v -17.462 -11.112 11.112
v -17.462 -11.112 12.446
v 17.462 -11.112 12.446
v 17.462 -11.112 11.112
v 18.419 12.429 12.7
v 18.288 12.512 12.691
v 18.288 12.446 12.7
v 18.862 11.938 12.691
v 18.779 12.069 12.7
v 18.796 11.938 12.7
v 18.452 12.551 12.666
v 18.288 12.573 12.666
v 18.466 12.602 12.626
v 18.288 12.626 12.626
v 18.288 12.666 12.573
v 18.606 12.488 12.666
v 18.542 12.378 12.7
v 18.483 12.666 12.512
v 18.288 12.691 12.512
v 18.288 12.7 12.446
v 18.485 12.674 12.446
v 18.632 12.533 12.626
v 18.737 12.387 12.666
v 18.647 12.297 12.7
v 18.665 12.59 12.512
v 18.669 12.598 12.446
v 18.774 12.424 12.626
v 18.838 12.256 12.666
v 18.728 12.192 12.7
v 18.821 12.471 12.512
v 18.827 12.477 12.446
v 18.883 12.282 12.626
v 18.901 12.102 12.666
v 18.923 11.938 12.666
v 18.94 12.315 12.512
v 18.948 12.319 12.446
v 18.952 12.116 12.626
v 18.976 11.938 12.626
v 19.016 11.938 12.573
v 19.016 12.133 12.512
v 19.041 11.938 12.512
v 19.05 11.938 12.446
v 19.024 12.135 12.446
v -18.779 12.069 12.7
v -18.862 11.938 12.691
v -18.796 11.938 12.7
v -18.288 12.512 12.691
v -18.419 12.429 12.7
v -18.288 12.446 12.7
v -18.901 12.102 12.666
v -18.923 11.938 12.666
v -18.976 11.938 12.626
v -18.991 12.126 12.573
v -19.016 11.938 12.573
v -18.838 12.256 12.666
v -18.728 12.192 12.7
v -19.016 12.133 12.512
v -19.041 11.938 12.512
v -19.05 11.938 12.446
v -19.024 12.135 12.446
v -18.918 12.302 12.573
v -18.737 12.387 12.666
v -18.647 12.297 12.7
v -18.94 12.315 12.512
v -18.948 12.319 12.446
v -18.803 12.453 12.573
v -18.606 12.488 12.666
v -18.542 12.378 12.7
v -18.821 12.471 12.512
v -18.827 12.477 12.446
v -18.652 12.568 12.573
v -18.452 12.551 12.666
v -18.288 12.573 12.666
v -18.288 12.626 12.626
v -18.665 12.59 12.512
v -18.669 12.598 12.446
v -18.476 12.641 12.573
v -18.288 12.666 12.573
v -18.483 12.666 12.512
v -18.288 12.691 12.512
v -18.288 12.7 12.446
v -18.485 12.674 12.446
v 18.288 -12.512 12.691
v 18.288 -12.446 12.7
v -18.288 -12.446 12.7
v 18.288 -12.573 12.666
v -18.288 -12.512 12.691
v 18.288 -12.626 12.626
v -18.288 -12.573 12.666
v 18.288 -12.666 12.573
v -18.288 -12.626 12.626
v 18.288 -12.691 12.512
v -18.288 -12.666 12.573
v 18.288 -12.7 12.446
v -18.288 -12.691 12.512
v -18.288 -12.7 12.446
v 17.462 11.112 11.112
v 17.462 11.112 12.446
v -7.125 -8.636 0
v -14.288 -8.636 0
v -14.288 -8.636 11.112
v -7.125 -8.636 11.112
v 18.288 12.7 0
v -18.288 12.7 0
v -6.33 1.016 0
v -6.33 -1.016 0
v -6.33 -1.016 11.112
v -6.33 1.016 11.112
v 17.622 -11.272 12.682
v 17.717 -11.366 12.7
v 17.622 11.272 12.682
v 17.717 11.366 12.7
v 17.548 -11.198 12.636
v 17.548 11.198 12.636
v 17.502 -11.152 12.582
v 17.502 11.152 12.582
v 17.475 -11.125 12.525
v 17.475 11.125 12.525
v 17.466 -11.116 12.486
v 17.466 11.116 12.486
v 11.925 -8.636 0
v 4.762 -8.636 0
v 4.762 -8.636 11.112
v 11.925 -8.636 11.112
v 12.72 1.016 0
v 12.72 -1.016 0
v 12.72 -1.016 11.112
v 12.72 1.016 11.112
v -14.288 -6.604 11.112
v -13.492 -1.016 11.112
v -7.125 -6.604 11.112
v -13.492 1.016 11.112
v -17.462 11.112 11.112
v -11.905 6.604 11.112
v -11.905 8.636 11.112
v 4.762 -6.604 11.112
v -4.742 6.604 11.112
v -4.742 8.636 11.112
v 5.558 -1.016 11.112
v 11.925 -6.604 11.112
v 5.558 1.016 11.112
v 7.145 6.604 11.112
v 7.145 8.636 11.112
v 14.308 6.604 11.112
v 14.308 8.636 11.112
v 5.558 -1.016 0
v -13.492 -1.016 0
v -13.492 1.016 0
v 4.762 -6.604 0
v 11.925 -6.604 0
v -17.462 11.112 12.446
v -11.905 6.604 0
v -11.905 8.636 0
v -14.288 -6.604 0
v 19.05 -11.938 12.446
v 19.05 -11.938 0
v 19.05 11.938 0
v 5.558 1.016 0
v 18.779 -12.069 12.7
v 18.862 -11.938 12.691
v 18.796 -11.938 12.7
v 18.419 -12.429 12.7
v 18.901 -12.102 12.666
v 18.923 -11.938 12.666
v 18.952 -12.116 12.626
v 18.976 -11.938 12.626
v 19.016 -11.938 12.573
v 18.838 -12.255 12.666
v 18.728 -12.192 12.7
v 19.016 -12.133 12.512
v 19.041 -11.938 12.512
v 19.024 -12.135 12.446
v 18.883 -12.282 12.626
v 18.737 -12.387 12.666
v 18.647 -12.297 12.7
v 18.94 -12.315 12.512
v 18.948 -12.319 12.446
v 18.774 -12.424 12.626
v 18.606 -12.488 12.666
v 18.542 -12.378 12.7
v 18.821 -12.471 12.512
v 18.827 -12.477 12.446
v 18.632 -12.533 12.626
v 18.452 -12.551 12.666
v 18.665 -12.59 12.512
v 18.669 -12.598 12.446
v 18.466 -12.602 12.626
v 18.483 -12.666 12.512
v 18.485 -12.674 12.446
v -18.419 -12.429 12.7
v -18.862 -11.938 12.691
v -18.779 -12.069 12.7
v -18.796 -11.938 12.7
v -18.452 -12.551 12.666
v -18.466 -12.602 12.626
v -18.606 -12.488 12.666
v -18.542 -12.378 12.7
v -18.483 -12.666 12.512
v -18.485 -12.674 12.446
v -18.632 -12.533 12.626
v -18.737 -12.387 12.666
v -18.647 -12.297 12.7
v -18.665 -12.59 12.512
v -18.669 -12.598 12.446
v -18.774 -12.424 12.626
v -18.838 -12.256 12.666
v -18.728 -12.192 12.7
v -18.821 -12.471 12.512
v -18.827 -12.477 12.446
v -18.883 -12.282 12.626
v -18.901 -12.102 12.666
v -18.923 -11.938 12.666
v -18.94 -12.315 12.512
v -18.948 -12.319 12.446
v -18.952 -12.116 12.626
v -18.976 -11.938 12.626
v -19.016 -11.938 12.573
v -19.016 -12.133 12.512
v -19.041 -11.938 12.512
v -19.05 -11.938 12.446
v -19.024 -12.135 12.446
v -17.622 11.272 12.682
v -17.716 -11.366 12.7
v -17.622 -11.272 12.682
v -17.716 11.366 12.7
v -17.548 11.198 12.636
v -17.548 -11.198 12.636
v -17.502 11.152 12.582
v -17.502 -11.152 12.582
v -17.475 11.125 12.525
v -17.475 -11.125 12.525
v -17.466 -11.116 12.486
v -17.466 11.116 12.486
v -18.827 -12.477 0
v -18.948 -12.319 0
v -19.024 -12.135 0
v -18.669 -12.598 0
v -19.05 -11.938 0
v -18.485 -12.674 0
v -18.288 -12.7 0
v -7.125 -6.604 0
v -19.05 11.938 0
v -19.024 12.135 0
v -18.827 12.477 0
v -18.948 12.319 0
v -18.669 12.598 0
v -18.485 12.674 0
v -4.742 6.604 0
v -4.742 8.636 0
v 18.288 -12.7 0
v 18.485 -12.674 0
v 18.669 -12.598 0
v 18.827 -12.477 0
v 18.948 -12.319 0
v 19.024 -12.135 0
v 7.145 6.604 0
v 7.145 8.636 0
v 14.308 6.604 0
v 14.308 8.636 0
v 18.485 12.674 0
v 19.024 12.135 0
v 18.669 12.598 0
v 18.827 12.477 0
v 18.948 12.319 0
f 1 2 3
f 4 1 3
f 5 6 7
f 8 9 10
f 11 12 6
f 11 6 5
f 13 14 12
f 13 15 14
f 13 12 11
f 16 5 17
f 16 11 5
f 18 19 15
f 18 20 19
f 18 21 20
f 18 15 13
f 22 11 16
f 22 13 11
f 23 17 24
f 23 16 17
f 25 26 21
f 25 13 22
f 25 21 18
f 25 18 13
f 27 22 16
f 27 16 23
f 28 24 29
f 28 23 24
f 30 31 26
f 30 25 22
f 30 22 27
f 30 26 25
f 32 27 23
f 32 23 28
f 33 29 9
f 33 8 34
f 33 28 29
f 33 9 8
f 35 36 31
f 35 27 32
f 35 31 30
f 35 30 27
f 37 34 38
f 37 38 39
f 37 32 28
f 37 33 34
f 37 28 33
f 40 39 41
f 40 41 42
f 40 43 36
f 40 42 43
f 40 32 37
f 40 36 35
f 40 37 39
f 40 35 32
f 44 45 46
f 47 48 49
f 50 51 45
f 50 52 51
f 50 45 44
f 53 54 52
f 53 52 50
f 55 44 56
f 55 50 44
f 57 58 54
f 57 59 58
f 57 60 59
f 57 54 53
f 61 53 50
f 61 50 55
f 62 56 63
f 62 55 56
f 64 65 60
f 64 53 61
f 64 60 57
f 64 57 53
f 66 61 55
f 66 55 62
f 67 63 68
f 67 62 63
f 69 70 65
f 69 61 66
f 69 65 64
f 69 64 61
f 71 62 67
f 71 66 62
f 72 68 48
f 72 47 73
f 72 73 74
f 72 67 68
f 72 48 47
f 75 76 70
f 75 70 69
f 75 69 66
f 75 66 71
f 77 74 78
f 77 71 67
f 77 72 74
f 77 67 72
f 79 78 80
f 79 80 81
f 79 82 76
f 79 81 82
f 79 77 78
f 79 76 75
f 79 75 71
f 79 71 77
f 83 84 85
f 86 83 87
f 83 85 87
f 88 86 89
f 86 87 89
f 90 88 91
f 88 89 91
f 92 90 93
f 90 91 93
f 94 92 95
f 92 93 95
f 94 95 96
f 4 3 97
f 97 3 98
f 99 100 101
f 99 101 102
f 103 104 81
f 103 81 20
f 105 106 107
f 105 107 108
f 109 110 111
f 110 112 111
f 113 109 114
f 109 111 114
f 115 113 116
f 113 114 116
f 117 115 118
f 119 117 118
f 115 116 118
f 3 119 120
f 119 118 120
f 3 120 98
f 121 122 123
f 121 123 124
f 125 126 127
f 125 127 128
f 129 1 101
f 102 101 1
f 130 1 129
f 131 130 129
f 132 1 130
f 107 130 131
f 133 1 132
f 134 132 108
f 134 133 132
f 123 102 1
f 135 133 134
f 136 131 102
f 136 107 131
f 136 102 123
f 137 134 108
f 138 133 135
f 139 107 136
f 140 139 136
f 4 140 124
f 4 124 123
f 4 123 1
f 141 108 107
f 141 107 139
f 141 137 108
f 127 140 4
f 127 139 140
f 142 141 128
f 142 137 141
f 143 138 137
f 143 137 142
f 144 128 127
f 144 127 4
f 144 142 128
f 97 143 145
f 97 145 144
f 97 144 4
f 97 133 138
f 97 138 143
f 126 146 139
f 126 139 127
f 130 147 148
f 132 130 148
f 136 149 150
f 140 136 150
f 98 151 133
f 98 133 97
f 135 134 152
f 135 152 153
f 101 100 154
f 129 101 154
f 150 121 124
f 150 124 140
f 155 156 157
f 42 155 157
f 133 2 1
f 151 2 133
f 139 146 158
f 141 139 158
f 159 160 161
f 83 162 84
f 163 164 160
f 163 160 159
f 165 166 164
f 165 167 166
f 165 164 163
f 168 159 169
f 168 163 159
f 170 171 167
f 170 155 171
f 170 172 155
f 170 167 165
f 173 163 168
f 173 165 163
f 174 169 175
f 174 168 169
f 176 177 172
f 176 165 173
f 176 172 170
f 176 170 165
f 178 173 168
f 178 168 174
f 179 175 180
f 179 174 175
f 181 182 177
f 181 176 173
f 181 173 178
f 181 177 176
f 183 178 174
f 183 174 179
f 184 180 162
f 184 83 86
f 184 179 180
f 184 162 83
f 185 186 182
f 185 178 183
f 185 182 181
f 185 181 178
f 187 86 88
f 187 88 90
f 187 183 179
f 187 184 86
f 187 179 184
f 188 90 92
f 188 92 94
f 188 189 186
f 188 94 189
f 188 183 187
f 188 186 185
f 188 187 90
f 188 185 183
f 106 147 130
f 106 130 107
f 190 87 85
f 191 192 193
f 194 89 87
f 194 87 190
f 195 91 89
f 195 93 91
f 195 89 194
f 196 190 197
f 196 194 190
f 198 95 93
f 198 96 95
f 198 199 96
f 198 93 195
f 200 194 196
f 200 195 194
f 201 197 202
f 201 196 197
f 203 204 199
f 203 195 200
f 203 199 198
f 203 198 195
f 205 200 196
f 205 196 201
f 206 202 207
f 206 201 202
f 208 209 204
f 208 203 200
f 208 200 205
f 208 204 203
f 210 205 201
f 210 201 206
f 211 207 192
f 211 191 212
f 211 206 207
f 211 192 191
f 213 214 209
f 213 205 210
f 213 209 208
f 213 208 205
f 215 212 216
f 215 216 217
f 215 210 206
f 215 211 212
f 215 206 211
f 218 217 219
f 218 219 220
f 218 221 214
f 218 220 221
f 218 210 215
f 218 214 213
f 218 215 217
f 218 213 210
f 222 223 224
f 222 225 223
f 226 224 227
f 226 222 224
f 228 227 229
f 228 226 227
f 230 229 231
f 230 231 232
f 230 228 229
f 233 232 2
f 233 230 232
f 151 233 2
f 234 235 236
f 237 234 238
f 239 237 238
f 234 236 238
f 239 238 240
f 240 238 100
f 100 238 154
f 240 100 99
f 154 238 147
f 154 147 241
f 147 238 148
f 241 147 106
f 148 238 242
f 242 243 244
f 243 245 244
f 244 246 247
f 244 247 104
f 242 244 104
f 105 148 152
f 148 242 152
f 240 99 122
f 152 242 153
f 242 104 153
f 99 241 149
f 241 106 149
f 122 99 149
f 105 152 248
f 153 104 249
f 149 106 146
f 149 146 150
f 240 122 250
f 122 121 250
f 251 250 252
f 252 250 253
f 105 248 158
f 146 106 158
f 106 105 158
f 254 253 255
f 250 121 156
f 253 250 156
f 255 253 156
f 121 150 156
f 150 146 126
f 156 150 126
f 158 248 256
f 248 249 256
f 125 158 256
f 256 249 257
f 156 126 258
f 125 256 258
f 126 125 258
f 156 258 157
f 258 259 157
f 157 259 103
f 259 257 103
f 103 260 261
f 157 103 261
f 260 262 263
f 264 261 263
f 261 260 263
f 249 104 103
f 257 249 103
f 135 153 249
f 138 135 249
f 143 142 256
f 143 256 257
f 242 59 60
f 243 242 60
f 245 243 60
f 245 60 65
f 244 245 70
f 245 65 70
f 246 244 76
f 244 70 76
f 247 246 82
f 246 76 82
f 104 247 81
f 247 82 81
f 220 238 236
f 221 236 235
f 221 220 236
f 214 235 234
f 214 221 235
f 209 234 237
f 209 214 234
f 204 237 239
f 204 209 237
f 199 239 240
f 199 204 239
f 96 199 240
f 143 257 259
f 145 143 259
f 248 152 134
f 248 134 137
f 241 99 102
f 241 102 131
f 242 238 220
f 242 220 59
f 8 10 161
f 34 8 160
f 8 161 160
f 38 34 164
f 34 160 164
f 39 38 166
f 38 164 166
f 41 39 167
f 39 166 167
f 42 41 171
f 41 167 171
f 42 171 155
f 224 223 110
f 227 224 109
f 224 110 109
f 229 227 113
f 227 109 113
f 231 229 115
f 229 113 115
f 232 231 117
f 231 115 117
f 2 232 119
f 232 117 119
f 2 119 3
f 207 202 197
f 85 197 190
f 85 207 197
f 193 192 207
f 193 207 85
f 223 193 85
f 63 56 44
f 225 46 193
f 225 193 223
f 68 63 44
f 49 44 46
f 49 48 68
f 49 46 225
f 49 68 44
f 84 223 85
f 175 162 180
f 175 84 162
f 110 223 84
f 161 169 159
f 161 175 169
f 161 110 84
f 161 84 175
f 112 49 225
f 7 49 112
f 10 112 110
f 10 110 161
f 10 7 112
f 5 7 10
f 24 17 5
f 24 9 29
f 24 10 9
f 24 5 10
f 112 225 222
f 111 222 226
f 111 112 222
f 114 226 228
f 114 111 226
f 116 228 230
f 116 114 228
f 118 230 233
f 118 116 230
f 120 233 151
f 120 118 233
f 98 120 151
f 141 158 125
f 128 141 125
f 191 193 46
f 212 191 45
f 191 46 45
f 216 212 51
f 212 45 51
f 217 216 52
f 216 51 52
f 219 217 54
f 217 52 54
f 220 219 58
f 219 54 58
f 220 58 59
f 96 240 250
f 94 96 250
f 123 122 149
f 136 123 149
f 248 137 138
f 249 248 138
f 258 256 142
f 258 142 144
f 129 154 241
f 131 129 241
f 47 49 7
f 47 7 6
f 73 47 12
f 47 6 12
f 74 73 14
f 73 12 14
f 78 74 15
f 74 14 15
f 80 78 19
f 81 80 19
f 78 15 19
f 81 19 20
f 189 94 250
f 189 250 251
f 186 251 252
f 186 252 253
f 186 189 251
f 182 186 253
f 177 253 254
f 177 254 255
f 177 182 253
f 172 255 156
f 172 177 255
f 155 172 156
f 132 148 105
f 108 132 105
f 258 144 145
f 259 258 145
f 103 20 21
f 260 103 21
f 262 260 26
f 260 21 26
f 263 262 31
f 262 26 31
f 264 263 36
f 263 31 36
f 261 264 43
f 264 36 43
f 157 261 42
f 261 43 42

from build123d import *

# Parameters (mm, degrees)
F0_W     = 38.1
F0_H     = 25.4
F1_DEPTH = 12.7
F2_W     = 34.925
F2_H     = 22.225
F3_DEPTH = 1.5875
F4_R     = 0.762
F5_R     = 0.254
F6_W     = 7.1628
F6_H     = 2.032
F7_DEPTH = 25.4


with BuildPart() as f1:
    # F0 (on Top) → F1 (new body)
    with BuildSketch(Plane.XY):
        Rectangle(F0_W, F0_H)
    extrude(amount=F1_DEPTH)

    # F2 (on face) → F3 (cut)
    with BuildSketch(Plane.XY.offset(12.7)):
        Rectangle(F2_W, F2_H)
    extrude(amount=-F3_DEPTH, mode=Mode.SUBTRACT)

    # F4
    f4_edges = [f1.edges().sort_by_distance(p)[0] for p in [
        (-19.05, -12.7, 6.35),
        (-19.05, 12.7, 6.35),
        (19.05, 12.7, 6.35),
        (19.05, -12.7, 6.35),
    ]]
    fillet(f4_edges, radius=F4_R)

    # F5
    f5_edges = [f1.edges().sort_by_distance(p)[0] for p in [
        (0, 12.7, 12.7),
        (18.826815, 12.476815, 12.7),
        (-18.826815, 12.476815, 12.7),
        (19.05, 0, 12.7),
        (-19.05, 0, 12.7),
        (18.826815, -12.476815, 12.7),
        (-18.826815, -12.476815, 12.7),
        (0, -12.7, 12.7),
        (0, 11.1125, 12.7),
        (-17.4625, 0, 12.7),
        (0, -11.1125, 12.7),
        (17.4625, 0, 12.7),
    ]]
    fillet(f5_edges, radius=F5_R)

    # F6 (on Top) → F7 (cut)
    with BuildSketch(Plane.XY):
        with Locations((-10.7061, -7.62)):
            Rectangle(F6_W, F6_H)
        with Locations((-9.91108, 0)):
            Rectangle(F6_W, F6_H)
        with Locations((-8.32358, 7.62)):
            Rectangle(F6_W, F6_H)
        with Locations((9.13892, 0)):
            Rectangle(F6_W, F6_H)
        with Locations((8.3439, -7.62)):
            Rectangle(F6_W, F6_H)
        with Locations((10.72642, 7.62)):
            Rectangle(F6_W, F6_H)
    extrude(amount=F7_DEPTH, mode=Mode.SUBTRACT)


solid = f1.part
